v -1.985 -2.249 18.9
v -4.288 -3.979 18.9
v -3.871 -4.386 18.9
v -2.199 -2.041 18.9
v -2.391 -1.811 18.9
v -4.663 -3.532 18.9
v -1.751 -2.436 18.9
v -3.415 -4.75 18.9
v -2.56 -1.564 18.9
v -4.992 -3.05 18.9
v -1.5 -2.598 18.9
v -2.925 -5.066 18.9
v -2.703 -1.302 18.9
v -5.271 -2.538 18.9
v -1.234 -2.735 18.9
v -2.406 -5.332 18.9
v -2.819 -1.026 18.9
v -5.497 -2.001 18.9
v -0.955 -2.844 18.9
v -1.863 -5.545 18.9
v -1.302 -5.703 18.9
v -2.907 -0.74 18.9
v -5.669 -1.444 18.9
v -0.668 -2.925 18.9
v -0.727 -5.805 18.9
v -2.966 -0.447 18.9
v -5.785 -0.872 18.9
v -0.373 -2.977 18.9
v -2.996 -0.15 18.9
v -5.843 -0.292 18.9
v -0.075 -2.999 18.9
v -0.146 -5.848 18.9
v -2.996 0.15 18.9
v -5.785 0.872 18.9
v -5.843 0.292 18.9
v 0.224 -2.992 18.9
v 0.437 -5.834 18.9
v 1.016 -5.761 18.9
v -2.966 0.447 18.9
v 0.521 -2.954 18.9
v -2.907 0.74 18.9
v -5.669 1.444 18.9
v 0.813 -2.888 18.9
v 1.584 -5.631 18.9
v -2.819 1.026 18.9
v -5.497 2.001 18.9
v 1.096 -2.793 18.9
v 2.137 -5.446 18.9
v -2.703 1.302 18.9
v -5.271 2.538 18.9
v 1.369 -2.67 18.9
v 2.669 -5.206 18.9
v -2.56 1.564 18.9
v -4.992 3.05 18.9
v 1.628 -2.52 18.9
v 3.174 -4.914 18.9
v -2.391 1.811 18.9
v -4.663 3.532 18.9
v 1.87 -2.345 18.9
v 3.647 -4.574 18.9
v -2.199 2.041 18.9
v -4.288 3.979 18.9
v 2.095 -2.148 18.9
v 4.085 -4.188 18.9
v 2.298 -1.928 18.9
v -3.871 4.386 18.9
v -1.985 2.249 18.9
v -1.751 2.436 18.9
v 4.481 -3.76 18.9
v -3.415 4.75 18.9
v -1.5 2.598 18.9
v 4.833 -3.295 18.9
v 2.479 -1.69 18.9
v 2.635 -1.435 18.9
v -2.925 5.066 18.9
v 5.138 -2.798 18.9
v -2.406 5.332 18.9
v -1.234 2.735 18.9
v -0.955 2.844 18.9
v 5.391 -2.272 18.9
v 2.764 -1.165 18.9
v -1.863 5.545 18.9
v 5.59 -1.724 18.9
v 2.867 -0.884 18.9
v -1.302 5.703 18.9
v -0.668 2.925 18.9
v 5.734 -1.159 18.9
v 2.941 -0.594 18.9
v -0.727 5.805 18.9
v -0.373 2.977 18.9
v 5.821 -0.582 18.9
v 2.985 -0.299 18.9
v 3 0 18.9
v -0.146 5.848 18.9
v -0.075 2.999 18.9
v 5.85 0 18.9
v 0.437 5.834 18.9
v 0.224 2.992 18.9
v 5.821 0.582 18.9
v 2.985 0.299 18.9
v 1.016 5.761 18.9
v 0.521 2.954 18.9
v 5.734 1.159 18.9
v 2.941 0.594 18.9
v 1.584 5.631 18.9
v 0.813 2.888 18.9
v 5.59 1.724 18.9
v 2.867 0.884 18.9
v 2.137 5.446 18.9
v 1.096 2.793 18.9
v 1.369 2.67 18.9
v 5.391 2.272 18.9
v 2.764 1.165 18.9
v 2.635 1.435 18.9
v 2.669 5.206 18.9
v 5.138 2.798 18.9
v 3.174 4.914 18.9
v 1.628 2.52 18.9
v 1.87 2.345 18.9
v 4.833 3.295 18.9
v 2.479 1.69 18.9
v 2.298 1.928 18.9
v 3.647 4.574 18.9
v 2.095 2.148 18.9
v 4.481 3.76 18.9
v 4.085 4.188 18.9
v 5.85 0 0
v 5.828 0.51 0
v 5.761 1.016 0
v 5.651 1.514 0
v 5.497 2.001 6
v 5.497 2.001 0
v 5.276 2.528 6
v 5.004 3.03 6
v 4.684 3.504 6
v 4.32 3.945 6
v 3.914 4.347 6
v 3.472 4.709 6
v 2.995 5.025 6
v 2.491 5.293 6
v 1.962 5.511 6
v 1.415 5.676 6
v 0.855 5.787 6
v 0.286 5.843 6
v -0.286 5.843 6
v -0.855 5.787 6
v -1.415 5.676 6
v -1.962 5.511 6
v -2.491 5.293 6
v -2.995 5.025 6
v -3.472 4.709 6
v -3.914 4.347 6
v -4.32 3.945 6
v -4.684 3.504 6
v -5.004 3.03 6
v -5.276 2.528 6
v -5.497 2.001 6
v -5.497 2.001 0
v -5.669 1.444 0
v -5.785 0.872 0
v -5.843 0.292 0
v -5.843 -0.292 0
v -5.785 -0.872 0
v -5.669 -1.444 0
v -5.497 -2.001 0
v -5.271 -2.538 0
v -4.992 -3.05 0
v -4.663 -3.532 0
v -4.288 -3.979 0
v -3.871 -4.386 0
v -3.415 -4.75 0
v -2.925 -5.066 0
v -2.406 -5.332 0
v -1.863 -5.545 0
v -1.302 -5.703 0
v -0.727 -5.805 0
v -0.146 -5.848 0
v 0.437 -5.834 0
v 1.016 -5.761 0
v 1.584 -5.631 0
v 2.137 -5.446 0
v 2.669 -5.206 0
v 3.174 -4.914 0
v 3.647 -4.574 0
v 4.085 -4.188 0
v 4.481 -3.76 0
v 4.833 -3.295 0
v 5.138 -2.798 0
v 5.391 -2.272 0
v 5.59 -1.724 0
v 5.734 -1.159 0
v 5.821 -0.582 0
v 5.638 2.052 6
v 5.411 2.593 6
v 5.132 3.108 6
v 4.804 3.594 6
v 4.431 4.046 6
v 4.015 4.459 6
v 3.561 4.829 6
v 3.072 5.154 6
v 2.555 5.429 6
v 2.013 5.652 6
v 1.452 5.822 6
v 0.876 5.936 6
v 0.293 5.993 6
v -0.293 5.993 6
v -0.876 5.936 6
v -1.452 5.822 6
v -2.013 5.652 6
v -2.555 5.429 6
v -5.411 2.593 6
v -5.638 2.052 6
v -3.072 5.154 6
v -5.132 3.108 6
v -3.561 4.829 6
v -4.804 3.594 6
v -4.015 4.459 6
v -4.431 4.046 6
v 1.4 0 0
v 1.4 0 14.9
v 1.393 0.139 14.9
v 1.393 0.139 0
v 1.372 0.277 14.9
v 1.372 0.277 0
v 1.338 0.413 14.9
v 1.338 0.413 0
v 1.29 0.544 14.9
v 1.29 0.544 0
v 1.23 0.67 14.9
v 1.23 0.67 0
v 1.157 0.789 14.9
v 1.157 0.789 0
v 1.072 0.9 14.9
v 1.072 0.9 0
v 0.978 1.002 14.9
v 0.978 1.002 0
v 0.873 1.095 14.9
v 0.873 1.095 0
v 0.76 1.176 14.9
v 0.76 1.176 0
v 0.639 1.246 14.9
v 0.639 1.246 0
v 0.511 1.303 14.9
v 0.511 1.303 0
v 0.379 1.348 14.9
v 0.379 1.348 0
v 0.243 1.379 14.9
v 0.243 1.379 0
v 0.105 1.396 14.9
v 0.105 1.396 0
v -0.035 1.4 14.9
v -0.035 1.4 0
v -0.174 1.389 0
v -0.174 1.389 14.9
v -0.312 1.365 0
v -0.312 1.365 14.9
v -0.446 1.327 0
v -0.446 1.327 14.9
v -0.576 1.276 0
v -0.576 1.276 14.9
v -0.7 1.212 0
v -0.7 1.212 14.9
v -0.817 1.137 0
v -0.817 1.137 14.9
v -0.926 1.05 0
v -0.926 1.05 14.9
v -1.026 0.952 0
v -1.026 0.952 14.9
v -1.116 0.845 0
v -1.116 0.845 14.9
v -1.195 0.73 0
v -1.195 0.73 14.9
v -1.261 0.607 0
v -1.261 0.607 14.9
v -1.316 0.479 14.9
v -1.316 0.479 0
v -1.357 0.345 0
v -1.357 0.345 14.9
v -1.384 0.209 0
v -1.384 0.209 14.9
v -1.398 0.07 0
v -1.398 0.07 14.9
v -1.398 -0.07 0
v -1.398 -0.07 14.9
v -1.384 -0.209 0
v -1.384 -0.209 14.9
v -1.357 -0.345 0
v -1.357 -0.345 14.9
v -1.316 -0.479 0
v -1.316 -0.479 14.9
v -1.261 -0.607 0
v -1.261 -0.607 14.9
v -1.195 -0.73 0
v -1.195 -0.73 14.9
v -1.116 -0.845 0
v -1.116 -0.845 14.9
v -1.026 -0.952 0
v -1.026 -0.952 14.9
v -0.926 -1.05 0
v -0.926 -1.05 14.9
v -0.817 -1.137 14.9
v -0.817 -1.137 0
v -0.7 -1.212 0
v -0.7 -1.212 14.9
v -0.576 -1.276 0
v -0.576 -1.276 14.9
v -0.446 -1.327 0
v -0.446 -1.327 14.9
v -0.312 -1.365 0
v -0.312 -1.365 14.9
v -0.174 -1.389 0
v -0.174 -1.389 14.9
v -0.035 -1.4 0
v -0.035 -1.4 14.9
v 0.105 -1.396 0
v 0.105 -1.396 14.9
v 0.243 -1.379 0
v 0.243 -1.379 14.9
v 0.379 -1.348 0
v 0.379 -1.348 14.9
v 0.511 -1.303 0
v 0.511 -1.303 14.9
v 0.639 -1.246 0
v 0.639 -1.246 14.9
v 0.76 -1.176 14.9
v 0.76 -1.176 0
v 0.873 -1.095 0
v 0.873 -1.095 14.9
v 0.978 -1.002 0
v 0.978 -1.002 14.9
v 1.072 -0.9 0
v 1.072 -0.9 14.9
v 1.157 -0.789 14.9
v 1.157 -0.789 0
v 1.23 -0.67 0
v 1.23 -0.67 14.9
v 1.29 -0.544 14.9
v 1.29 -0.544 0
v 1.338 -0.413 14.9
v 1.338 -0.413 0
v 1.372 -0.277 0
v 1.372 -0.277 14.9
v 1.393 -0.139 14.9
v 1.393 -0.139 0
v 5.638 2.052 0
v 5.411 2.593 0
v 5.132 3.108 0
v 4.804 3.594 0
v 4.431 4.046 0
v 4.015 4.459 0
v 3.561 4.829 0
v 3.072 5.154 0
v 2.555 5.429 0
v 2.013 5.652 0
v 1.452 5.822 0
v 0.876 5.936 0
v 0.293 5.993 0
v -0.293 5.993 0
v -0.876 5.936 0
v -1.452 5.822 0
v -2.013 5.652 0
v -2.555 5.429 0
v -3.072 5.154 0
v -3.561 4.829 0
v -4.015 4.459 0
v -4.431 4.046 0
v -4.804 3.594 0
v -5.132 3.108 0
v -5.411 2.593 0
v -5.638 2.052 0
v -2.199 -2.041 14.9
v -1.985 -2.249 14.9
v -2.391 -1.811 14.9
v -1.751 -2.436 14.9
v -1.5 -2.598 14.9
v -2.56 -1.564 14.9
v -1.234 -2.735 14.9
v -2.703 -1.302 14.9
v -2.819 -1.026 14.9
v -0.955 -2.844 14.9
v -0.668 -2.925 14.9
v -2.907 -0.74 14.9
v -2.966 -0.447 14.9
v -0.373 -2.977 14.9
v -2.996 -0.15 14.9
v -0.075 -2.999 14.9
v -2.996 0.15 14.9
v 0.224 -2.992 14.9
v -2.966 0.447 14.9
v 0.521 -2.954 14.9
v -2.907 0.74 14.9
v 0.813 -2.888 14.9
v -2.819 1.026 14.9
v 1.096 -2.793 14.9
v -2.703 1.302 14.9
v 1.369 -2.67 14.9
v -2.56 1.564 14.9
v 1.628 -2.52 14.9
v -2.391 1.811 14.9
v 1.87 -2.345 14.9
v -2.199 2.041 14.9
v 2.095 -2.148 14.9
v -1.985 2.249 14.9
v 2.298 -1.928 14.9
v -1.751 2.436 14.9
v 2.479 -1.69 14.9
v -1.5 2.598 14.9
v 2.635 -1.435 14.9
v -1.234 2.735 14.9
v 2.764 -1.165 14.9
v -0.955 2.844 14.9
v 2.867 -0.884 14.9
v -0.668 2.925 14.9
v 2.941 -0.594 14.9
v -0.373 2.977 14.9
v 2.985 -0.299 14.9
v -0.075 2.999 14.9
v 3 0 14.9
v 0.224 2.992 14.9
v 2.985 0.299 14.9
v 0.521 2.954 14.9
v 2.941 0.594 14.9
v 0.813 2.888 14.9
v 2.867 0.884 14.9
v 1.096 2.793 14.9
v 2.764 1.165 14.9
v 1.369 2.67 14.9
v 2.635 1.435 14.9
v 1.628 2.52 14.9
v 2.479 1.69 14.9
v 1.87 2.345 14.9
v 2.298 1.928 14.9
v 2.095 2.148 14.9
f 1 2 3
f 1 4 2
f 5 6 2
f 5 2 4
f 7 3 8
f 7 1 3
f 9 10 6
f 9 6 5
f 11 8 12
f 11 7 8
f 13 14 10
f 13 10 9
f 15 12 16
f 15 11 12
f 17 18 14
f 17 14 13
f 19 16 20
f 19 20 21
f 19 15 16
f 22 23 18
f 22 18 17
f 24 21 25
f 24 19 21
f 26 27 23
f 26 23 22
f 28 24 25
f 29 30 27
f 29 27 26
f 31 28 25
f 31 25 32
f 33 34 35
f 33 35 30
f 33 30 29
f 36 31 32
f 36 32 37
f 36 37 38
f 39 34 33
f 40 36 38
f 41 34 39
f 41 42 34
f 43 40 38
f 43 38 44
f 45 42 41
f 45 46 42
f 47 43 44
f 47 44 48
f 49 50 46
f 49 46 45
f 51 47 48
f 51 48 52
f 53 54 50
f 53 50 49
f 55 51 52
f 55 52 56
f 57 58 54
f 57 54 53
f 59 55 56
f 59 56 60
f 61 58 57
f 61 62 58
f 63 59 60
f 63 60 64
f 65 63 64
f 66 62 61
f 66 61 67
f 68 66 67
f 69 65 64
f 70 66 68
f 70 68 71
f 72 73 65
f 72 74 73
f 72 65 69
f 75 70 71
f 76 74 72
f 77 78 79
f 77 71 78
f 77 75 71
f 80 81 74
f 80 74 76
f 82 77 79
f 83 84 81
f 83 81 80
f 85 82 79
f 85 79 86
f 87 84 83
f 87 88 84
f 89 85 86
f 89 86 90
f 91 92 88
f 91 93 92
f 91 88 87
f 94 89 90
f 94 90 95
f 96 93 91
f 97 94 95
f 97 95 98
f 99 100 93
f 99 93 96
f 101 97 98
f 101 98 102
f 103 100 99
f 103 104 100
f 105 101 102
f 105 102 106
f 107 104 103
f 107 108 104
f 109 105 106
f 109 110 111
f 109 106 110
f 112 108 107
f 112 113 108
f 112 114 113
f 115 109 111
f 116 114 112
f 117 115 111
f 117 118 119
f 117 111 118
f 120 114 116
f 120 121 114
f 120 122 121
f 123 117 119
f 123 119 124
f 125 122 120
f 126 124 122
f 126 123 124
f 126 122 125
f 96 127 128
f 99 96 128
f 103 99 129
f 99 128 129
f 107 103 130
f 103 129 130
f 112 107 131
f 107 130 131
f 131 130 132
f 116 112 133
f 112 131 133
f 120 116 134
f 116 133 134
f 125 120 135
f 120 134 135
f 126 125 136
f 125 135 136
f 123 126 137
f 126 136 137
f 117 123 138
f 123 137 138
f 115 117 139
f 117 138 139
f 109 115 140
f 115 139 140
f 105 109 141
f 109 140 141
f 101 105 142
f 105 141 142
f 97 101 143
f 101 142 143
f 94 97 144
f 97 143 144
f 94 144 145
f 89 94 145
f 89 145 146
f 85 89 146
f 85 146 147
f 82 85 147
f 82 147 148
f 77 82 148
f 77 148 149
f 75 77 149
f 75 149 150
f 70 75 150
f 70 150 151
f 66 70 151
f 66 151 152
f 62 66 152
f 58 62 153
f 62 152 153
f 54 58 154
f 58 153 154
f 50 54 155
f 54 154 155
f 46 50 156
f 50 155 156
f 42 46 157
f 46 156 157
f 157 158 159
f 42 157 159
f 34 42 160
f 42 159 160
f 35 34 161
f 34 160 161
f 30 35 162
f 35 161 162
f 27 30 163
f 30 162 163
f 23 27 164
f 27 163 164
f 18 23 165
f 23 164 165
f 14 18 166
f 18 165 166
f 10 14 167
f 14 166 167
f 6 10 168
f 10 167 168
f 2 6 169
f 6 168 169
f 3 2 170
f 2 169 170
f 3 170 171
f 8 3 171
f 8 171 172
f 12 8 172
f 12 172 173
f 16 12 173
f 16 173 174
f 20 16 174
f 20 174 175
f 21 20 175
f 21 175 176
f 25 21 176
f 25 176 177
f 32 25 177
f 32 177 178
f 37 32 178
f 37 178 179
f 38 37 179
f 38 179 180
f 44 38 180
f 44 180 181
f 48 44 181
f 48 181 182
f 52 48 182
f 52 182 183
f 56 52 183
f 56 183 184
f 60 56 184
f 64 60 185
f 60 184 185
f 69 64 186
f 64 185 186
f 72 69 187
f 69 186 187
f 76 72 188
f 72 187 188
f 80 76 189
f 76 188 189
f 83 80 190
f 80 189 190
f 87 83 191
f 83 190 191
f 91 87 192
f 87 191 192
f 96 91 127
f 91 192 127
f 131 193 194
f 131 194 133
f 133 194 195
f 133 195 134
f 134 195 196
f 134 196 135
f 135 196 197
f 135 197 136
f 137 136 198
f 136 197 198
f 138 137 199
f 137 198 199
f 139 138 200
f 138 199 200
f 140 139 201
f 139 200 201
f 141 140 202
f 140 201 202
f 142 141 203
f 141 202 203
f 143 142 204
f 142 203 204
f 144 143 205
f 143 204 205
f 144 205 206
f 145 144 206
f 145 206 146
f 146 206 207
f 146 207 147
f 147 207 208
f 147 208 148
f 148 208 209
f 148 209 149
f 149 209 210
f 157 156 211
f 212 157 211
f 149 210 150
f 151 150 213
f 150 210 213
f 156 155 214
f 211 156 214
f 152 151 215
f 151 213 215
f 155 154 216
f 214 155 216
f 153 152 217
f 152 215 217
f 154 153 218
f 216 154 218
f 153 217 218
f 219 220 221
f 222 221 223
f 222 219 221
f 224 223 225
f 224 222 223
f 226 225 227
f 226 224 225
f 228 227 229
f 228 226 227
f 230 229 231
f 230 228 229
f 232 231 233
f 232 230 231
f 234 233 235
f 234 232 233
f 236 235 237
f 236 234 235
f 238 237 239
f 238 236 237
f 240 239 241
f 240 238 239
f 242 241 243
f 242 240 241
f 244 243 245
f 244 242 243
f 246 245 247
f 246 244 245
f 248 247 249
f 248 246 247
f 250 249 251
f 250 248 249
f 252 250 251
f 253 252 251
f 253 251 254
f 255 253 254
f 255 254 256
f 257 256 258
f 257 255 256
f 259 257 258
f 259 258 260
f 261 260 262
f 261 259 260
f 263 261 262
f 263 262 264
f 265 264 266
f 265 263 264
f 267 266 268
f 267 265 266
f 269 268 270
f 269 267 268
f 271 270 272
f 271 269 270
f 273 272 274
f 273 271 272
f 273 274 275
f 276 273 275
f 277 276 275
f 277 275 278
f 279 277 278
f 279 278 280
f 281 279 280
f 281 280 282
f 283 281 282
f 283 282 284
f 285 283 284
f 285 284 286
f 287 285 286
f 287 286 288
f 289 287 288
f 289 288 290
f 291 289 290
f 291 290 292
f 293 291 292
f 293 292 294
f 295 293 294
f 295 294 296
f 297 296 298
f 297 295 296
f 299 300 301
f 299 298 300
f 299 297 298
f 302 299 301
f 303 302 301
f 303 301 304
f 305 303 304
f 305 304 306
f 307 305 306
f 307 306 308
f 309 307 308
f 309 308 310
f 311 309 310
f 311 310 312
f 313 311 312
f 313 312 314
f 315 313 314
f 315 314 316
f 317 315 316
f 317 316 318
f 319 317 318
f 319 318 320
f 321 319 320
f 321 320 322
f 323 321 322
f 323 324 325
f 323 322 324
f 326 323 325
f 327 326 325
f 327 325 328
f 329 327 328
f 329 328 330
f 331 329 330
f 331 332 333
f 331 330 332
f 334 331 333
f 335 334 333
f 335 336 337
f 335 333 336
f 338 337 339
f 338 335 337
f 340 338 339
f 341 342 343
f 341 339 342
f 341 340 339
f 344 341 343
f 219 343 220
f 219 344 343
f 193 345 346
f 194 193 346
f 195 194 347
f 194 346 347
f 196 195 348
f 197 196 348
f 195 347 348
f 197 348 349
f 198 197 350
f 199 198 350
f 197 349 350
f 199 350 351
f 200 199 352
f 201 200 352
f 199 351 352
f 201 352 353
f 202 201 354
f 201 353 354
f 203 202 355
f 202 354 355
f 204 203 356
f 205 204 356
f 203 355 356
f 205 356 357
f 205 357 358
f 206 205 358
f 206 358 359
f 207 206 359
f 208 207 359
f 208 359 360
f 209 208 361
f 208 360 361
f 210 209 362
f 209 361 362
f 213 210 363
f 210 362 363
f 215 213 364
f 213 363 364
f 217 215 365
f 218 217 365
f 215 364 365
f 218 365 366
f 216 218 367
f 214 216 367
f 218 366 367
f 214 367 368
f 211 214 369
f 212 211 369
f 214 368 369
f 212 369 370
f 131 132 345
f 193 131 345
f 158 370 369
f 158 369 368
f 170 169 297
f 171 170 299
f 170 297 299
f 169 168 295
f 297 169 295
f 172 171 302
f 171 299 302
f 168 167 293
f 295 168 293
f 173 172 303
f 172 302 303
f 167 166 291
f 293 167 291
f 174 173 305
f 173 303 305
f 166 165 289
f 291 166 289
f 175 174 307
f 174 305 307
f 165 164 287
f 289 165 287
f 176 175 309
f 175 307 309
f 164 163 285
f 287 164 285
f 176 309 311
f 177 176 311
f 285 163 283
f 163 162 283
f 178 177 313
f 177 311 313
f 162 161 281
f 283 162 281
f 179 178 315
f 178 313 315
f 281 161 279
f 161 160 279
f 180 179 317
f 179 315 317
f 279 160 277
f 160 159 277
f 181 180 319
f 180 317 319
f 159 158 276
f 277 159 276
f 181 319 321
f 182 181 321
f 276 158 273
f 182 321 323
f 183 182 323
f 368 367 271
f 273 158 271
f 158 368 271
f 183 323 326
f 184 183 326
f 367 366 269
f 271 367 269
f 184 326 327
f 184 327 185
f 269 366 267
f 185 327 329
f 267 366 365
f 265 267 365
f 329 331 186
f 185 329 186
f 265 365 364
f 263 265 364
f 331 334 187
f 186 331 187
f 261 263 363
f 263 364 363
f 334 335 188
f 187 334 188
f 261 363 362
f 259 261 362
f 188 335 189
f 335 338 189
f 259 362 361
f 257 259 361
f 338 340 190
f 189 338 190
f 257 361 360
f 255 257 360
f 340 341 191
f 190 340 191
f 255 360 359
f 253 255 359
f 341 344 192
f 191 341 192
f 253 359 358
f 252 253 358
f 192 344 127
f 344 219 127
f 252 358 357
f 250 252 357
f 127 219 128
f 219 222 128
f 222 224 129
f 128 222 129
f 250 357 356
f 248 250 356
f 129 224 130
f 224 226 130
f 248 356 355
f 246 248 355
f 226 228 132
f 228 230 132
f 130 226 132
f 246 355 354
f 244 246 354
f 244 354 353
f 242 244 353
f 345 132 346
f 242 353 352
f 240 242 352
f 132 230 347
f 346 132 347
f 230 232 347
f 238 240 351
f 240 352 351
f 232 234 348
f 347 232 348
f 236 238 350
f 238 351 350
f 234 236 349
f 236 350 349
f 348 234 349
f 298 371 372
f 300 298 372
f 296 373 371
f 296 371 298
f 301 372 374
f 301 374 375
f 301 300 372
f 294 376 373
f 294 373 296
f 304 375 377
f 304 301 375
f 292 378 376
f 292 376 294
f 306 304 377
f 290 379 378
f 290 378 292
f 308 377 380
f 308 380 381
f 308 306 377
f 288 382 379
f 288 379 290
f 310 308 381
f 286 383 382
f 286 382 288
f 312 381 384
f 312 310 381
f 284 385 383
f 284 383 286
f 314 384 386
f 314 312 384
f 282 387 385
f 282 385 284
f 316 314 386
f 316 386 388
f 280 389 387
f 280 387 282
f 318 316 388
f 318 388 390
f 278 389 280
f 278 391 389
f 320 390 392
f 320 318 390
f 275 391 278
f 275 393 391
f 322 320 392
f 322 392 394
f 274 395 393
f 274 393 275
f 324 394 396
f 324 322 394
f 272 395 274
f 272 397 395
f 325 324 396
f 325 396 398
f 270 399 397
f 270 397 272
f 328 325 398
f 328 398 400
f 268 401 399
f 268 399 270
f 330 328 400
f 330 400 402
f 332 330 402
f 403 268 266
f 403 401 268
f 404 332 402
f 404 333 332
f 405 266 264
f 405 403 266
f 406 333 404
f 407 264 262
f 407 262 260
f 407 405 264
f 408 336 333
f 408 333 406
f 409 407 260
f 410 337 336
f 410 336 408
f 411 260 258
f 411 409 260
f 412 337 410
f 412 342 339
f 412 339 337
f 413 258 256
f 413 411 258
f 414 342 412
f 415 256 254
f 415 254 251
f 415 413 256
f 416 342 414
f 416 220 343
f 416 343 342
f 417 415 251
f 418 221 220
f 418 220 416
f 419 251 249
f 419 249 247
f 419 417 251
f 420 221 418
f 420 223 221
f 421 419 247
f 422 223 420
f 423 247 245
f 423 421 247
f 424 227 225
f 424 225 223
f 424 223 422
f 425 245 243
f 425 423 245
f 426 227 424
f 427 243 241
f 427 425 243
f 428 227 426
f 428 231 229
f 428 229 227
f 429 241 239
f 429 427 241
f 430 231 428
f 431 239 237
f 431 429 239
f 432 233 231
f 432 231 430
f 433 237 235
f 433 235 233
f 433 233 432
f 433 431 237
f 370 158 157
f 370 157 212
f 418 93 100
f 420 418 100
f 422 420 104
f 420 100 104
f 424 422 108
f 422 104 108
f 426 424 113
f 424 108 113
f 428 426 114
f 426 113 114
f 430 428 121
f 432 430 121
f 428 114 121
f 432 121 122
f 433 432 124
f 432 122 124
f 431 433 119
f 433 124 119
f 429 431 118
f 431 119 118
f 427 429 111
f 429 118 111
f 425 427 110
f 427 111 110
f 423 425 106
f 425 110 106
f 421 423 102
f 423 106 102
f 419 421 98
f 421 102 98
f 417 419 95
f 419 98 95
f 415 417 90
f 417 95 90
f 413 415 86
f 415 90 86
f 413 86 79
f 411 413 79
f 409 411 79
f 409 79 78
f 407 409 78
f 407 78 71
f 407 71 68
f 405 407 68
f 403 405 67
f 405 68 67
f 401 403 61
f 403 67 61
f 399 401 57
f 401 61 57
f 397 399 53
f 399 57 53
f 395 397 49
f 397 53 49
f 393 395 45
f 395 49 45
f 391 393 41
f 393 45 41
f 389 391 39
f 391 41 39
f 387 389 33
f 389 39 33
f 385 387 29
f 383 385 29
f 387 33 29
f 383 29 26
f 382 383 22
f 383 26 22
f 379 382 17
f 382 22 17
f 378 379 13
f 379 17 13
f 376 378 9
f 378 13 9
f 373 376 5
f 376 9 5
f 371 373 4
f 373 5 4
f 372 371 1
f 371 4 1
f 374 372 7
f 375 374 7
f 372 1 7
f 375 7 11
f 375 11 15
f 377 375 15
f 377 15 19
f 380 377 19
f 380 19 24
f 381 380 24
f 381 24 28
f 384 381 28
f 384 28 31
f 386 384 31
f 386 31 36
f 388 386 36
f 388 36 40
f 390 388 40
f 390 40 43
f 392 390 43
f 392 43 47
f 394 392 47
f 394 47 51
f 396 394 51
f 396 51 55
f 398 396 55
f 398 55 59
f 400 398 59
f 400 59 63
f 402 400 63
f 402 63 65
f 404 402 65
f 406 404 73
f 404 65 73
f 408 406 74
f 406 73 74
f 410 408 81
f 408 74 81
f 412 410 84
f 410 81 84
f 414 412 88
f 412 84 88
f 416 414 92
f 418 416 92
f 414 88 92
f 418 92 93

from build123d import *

# Parameters (mm, degrees)
SKETCH011_R     = 5.85
SKETCH011_R_2   = 1.4
PAD002_DEPTH    = 18.9
PAD007_DEPTH    = 6
SKETCH013_R     = 3
POCKET009_DEPTH = 4


with BuildPart() as part:
    # Sketch011 → Pad002 (new body)
    with BuildSketch(Plane.XY):
        Circle(SKETCH011_R)
        Circle(SKETCH011_R_2, mode=Mode.SUBTRACT)
    extrude(amount=PAD002_DEPTH)

    # Sketch012 → Pad007 (join)
    with BuildSketch(Plane.XY):
        with BuildLine():
            ThreePointArc((5.497202, 2.000818), (0, 5.85), (-5.497202, 2.000818))
            Line((-5.497202, 2.000818), (-5.638156, 2.052121))
            ThreePointArc((5.638156, 2.052121), (0, 6), (-5.638156, 2.052121))
            Line((5.497202, 2.000818), (5.638156, 2.052121))
        make_face()
    extrude(amount=PAD007_DEPTH)

    # Sketch013 → Pocket009 (cut)
    with BuildSketch(Plane.XY.offset(18.9)):
        Circle(SKETCH013_R)
    extrude(amount=-POCKET009_DEPTH, mode=Mode.SUBTRACT)


solid = part.part
